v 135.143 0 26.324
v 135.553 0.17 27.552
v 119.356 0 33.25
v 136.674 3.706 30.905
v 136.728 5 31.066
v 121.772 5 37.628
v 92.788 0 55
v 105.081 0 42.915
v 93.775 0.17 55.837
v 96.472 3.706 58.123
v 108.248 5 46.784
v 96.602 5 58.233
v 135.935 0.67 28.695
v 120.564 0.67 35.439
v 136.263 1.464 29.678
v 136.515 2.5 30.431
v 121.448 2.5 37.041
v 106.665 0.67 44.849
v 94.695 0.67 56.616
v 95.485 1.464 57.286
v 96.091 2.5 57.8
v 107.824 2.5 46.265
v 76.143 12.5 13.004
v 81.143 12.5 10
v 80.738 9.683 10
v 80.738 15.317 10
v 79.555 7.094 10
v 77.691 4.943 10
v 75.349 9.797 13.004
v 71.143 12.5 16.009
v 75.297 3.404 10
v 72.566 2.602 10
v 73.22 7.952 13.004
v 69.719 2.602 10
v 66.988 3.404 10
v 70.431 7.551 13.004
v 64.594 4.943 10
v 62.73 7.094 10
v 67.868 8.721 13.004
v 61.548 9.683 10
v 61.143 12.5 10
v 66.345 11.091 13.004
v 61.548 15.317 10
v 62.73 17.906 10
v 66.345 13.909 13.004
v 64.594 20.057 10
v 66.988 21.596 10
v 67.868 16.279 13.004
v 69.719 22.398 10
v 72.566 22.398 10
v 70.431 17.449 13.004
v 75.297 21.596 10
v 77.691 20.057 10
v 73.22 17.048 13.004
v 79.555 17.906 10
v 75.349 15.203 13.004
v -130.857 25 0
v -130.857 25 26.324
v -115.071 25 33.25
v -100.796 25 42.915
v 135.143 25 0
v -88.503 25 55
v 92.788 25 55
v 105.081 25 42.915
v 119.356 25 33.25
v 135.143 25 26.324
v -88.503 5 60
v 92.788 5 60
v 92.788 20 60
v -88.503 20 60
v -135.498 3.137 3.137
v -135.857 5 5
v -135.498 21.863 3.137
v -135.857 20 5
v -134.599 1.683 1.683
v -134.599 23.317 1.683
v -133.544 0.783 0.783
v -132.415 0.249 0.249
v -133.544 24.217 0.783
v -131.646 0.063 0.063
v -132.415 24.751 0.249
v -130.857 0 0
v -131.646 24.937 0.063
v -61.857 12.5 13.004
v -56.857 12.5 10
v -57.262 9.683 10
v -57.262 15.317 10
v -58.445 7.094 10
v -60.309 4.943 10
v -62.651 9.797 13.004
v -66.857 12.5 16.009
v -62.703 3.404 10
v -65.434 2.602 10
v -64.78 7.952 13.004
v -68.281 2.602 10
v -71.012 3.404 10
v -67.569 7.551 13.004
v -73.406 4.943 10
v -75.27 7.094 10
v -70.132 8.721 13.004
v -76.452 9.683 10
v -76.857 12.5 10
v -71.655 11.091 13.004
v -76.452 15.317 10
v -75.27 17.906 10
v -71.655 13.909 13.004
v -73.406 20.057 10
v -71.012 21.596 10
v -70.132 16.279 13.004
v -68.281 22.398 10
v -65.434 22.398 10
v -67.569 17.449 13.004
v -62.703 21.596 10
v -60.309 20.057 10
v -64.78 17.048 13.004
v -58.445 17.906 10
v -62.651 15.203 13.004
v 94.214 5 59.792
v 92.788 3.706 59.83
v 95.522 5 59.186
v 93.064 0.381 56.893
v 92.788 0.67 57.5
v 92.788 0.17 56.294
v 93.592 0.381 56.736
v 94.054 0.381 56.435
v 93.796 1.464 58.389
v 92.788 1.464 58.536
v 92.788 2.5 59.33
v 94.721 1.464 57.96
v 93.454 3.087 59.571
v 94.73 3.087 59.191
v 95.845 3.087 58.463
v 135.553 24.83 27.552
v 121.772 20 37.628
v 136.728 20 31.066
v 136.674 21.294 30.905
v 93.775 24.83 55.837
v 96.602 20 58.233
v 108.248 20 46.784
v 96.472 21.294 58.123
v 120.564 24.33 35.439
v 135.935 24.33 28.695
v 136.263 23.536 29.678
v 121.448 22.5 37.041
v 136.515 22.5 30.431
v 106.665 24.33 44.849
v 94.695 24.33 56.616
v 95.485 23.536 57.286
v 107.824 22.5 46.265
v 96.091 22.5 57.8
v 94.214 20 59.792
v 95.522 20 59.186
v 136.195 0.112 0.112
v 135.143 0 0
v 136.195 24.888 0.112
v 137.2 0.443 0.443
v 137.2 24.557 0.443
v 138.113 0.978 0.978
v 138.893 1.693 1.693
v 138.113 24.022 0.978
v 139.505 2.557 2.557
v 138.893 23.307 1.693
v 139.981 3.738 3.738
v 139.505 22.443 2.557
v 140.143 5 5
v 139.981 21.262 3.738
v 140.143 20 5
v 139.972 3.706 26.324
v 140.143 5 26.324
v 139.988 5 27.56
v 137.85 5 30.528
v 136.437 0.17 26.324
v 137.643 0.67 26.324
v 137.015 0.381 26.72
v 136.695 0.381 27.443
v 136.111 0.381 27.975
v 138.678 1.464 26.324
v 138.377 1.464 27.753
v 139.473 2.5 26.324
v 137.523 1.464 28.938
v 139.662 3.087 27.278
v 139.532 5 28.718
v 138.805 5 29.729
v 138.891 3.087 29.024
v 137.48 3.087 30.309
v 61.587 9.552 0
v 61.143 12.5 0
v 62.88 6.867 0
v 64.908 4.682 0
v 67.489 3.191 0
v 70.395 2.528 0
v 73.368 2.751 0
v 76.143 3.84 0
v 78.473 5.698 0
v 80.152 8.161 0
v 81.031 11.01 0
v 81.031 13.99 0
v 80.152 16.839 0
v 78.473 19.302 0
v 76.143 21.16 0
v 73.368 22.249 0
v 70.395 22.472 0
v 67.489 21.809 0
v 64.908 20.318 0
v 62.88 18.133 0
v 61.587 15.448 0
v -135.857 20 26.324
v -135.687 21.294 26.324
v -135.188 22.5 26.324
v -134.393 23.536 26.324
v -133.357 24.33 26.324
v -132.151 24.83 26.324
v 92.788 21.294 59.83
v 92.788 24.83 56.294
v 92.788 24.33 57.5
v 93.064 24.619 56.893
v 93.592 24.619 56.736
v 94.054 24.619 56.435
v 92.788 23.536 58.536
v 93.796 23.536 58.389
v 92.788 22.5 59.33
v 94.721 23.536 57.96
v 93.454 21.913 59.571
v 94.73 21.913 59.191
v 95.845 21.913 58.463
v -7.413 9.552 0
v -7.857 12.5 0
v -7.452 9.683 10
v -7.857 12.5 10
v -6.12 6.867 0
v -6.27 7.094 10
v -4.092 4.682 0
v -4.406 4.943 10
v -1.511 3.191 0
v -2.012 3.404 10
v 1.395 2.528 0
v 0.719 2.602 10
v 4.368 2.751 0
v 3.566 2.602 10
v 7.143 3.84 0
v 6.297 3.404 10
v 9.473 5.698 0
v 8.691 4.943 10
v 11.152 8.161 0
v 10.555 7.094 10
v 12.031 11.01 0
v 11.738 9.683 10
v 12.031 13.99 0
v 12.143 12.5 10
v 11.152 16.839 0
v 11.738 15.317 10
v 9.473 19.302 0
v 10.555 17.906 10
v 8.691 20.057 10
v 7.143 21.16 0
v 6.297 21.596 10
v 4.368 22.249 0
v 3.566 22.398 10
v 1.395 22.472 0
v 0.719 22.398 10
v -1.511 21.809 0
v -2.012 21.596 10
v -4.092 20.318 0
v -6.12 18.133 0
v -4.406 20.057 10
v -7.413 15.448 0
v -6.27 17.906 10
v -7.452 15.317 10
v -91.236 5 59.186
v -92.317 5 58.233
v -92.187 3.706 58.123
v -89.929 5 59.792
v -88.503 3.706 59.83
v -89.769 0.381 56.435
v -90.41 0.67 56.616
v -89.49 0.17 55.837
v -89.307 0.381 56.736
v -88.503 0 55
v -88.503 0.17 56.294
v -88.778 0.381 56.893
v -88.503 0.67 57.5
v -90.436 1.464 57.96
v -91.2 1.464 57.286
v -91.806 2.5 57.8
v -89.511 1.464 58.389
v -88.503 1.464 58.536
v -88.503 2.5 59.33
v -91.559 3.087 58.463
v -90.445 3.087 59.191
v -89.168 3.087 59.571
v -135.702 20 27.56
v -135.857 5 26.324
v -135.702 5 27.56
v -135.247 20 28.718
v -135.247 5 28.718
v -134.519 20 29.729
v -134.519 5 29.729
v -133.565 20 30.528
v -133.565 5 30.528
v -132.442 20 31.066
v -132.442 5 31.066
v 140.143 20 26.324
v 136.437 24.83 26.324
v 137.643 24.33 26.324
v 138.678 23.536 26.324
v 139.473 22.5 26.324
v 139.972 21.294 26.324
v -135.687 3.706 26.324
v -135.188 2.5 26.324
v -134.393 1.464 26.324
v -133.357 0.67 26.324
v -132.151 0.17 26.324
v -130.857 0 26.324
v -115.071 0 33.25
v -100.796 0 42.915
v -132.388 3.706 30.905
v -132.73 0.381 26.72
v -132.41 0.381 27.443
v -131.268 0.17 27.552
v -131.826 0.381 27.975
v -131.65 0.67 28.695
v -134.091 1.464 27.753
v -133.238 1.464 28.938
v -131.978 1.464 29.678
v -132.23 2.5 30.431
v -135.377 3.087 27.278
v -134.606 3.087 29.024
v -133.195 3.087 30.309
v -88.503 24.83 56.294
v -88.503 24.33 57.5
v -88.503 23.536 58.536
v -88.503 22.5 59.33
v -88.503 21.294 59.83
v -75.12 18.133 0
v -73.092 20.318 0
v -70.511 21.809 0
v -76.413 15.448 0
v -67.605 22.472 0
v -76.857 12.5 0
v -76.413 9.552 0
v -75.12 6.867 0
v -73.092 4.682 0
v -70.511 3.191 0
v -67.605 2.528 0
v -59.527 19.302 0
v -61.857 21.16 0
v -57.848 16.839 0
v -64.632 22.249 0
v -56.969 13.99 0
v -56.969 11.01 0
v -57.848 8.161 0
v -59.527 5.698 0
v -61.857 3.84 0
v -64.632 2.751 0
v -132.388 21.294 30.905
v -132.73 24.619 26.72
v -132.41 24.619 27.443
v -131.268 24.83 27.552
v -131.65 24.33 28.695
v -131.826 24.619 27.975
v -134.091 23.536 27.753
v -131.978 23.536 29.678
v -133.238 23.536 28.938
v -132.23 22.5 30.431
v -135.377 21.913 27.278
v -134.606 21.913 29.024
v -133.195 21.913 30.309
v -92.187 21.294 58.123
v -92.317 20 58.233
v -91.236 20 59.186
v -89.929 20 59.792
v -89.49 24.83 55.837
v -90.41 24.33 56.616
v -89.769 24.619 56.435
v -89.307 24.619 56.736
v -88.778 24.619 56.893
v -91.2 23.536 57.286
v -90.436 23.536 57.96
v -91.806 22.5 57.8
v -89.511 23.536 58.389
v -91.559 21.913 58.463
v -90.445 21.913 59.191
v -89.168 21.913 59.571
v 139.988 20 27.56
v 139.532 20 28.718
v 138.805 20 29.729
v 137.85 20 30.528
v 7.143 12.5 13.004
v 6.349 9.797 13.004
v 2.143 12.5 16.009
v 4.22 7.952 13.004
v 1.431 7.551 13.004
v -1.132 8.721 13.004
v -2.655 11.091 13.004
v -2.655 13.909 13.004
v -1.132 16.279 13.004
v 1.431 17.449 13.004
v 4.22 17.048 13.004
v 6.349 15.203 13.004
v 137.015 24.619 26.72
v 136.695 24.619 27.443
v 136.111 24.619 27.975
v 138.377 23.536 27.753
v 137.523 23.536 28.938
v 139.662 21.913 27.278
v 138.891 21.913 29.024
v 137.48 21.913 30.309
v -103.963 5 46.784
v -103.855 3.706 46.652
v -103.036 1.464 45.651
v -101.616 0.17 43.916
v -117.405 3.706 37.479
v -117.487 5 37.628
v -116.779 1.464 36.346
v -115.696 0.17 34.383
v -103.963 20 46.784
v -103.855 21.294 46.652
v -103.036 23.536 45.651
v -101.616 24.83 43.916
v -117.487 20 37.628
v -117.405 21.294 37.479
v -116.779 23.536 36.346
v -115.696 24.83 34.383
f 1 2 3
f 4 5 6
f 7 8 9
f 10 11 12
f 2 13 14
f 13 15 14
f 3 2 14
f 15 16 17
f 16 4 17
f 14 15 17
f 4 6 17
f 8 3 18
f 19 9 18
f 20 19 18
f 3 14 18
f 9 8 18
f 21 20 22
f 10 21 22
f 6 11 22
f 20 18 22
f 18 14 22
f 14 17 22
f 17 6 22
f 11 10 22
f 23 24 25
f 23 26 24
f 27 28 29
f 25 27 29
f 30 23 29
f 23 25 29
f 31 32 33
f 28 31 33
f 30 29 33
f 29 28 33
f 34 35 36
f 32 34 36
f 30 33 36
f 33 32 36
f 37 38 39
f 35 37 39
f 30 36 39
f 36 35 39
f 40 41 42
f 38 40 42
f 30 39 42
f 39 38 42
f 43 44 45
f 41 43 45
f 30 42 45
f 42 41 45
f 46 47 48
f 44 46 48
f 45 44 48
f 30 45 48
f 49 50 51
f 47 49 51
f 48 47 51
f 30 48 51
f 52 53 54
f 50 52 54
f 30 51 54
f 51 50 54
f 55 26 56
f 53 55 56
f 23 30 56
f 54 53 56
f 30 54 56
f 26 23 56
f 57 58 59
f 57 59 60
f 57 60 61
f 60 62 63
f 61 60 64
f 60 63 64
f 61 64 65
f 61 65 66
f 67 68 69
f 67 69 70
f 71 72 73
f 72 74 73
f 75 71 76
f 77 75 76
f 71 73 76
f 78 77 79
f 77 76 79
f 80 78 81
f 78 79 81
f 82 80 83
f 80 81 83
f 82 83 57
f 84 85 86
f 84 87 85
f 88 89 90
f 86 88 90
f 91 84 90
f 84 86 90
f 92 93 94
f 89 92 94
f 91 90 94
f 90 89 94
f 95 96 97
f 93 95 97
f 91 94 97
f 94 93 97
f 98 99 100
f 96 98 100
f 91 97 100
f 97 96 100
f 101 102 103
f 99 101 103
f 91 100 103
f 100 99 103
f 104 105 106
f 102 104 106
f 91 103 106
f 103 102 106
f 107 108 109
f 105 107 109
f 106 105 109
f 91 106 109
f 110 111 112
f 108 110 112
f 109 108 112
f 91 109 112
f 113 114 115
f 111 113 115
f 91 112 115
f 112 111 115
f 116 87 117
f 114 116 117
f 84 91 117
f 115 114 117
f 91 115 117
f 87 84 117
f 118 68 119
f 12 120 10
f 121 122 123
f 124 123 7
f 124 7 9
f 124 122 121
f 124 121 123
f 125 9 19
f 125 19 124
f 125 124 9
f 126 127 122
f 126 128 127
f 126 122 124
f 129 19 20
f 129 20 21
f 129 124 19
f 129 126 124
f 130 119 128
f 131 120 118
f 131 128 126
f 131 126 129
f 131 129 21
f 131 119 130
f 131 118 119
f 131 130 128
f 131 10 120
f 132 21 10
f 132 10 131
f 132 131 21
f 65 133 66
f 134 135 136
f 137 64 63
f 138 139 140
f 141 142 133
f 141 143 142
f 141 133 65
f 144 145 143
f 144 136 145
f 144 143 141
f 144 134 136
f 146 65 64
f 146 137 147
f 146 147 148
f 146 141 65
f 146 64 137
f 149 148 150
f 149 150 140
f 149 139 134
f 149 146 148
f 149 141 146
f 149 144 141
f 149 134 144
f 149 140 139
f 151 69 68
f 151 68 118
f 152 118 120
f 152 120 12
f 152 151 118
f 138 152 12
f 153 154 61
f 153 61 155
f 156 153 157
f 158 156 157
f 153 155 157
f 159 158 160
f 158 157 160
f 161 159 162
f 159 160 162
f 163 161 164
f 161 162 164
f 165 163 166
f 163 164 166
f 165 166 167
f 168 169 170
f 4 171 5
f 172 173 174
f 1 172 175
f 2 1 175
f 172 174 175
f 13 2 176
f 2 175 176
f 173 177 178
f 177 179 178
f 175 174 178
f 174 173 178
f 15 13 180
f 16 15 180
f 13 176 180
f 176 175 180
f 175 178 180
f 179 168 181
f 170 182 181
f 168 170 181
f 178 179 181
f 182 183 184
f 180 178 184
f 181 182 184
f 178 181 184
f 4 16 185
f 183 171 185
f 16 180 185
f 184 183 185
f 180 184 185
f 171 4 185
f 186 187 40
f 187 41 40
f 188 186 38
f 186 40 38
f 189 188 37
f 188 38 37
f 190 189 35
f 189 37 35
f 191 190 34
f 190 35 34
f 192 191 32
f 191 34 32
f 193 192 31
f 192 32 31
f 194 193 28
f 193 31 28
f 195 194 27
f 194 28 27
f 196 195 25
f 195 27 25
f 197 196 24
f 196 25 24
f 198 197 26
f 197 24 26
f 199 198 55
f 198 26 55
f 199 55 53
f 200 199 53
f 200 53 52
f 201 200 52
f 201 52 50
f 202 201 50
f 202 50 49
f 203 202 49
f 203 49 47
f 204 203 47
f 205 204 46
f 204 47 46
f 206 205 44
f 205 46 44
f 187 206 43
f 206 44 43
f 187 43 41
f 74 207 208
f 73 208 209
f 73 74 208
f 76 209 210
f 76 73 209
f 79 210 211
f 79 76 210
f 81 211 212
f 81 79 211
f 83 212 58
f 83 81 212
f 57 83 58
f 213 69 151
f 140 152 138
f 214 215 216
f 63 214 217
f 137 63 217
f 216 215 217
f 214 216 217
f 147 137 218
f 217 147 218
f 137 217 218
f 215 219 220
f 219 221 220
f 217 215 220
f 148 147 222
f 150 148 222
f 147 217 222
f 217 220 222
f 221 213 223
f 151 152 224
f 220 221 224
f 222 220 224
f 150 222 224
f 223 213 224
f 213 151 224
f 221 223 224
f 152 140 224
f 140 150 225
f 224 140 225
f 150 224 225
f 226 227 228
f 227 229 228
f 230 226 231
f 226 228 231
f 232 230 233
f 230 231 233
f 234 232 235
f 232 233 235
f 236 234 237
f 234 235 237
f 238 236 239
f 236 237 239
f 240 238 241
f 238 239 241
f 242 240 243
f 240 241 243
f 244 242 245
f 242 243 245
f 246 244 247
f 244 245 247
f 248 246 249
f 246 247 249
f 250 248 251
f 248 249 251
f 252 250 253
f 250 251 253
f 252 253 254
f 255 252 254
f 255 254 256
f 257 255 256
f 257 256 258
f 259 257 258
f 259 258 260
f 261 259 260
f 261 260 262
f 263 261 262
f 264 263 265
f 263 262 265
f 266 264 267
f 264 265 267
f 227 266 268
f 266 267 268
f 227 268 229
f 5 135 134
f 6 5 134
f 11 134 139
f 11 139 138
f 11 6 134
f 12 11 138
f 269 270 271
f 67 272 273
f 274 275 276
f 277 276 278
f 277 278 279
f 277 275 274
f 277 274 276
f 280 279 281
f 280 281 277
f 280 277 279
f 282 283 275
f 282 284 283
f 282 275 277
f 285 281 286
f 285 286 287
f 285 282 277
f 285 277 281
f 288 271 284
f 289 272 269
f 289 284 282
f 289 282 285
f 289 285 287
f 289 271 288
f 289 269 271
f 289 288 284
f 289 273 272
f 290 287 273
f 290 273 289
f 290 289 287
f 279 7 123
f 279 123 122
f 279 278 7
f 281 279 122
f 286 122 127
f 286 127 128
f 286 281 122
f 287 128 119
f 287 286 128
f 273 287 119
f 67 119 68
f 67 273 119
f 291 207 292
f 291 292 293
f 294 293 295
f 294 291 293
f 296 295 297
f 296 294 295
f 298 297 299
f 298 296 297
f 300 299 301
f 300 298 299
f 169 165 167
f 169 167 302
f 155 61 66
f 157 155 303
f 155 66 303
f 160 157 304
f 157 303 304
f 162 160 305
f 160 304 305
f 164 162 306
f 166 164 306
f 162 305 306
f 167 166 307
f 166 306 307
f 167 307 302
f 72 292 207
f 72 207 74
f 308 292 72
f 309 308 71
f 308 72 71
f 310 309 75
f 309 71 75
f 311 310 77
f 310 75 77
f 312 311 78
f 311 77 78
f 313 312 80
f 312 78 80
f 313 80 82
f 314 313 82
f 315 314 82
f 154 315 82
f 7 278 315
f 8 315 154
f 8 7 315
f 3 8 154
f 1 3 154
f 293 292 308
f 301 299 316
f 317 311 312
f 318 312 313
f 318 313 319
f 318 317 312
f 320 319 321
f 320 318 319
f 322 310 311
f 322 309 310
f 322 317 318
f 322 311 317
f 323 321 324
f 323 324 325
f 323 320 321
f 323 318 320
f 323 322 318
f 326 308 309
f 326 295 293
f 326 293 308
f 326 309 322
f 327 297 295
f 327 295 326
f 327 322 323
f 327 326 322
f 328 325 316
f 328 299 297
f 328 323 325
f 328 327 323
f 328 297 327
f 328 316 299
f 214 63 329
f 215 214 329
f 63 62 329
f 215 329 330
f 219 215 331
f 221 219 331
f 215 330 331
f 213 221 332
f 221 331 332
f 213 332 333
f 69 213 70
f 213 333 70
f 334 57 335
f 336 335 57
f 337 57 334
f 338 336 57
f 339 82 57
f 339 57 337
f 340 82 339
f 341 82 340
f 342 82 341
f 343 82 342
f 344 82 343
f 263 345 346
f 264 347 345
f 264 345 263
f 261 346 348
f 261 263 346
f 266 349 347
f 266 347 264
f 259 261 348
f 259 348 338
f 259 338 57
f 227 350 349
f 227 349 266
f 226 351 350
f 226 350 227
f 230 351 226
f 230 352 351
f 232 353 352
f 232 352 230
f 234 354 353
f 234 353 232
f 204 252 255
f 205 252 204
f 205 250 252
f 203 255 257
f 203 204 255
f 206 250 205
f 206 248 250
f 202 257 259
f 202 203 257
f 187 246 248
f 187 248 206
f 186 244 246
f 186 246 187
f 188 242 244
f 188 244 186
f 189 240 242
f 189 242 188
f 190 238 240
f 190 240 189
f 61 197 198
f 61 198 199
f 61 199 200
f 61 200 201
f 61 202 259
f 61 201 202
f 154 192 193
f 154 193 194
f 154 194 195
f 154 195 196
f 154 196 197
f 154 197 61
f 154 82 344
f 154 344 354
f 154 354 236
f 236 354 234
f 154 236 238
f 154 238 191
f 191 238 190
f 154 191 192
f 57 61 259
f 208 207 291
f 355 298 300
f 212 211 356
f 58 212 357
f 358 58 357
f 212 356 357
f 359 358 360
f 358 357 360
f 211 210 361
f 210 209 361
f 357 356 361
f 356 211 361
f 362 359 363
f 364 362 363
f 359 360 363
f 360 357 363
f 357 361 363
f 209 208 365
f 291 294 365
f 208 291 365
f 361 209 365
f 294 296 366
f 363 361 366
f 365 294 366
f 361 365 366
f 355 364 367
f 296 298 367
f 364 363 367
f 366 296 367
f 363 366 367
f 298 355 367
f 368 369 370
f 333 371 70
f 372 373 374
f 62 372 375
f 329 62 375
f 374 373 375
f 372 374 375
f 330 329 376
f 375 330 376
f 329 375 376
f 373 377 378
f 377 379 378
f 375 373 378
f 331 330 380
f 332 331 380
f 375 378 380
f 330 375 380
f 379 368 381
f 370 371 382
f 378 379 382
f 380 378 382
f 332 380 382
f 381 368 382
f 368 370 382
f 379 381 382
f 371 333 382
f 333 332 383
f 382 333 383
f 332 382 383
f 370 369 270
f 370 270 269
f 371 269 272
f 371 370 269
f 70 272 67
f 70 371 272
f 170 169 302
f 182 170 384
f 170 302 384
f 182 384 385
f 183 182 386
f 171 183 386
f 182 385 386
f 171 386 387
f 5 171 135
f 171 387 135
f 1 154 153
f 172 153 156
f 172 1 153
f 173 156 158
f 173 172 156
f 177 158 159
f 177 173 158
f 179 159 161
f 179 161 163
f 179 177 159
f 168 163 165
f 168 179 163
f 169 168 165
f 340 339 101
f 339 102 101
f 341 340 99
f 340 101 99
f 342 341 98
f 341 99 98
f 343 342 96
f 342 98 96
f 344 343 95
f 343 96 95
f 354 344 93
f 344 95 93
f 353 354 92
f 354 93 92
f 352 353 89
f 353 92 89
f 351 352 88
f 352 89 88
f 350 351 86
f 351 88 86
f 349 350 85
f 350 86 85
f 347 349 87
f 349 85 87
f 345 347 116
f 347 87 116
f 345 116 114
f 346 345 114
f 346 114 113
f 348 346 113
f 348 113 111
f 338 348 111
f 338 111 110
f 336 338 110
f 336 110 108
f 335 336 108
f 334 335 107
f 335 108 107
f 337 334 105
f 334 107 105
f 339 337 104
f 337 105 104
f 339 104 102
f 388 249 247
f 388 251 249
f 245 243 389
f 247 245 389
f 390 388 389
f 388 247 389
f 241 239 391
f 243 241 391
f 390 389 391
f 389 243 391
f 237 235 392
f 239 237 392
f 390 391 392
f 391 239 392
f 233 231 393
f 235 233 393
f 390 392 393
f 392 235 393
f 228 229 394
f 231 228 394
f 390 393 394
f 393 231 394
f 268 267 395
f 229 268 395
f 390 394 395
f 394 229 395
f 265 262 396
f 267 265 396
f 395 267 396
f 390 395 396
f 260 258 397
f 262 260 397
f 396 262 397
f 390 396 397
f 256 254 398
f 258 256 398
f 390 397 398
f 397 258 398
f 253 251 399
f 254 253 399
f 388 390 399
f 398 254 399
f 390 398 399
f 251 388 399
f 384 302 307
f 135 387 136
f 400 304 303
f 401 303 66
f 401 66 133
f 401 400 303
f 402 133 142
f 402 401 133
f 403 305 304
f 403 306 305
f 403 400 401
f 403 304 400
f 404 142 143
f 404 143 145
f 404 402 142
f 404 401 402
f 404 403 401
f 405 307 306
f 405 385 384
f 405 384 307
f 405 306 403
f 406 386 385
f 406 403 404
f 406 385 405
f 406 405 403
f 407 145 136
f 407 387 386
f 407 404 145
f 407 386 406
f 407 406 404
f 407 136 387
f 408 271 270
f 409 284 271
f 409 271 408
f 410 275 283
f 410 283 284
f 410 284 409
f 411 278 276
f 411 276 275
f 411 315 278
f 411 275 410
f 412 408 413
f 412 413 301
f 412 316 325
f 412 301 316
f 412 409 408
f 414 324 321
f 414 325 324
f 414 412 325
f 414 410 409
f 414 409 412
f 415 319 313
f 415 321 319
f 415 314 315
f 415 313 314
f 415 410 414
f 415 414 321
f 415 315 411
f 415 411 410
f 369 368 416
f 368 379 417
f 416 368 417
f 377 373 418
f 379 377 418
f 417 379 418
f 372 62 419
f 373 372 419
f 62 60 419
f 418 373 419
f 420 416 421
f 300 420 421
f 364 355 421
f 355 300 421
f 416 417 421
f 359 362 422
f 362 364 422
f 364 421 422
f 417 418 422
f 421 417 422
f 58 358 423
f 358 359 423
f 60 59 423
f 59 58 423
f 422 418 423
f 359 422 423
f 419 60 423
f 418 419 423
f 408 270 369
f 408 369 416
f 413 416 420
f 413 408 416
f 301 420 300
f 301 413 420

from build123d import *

# Parameters (mm, degrees)
F1_DEPTH = 25
F3_D     = 20
F3_DEPTH = 10
F3_TIP   = 6.0086061903
F4_R     = 5


with BuildPart() as f1:
    # F0 (on Front) → F1 (new body)
    with BuildSketch(Plane.XZ):
        with BuildLine():
            Line((-135.8573855514, 30), (-135.8573855514, 0))
            Line((-135.8573855514, 0), (140.1426144486, 0))
            Line((140.1426144486, 0), (140.1426144486, 30))
            ThreePointArc((140.1426144486, 30), (115.3358512852, 41.5398552549), (95.1426144486, 60))
            Line((95.1426144486, 60), (-90.8573855514, 60))
            ThreePointArc((-90.8573855514, 60), (-111.0506223879, 41.5398552549), (-135.8573855514, 30))
        make_face()
    extrude(amount=-F1_DEPTH)

    # F3
    with Locations(Plane(origin=(0, 0, 0), x_dir=(1, 0, 0), z_dir=(0, 0, -1))):
        with Locations((-66.8573855514, -12.5), (2.1426144486, -12.5), (71.1426144486, -12.5)):
            Hole(F3_D / 2, depth=F3_DEPTH)
            with Locations((0, 0, -(F3_DEPTH + F3_TIP / 2))):  # 118° drill point
                Cone(0, F3_D / 2, F3_TIP, mode=Mode.SUBTRACT)

    # F4
    f4_edges = [f1.edges().sort_by_distance(p)[0] for p in [
        (140.142614, 12.5, 0),
        (140.142614, 12.5, 30),
        (140.142614, 0, 15),
        (140.142614, 25, 15),
        (-135.857386, 12.5, 30),
        (-135.857386, 12.5, 0),
        (-135.857386, 0, 15),
        (-135.857386, 25, 15),
        (-90.857386, 12.5, 60),
        (-111.050622, 0, 41.539855),
        (-111.050622, 25, 41.539855),
        (95.142614, 12.5, 60),
        (2.142614, 0, 60),
        (2.142614, 25, 60),
        (115.335851, 0, 41.539855),
        (115.335851, 25, 41.539855),
    ]]
    fillet(f4_edges, radius=F4_R)


solid = f1.part
